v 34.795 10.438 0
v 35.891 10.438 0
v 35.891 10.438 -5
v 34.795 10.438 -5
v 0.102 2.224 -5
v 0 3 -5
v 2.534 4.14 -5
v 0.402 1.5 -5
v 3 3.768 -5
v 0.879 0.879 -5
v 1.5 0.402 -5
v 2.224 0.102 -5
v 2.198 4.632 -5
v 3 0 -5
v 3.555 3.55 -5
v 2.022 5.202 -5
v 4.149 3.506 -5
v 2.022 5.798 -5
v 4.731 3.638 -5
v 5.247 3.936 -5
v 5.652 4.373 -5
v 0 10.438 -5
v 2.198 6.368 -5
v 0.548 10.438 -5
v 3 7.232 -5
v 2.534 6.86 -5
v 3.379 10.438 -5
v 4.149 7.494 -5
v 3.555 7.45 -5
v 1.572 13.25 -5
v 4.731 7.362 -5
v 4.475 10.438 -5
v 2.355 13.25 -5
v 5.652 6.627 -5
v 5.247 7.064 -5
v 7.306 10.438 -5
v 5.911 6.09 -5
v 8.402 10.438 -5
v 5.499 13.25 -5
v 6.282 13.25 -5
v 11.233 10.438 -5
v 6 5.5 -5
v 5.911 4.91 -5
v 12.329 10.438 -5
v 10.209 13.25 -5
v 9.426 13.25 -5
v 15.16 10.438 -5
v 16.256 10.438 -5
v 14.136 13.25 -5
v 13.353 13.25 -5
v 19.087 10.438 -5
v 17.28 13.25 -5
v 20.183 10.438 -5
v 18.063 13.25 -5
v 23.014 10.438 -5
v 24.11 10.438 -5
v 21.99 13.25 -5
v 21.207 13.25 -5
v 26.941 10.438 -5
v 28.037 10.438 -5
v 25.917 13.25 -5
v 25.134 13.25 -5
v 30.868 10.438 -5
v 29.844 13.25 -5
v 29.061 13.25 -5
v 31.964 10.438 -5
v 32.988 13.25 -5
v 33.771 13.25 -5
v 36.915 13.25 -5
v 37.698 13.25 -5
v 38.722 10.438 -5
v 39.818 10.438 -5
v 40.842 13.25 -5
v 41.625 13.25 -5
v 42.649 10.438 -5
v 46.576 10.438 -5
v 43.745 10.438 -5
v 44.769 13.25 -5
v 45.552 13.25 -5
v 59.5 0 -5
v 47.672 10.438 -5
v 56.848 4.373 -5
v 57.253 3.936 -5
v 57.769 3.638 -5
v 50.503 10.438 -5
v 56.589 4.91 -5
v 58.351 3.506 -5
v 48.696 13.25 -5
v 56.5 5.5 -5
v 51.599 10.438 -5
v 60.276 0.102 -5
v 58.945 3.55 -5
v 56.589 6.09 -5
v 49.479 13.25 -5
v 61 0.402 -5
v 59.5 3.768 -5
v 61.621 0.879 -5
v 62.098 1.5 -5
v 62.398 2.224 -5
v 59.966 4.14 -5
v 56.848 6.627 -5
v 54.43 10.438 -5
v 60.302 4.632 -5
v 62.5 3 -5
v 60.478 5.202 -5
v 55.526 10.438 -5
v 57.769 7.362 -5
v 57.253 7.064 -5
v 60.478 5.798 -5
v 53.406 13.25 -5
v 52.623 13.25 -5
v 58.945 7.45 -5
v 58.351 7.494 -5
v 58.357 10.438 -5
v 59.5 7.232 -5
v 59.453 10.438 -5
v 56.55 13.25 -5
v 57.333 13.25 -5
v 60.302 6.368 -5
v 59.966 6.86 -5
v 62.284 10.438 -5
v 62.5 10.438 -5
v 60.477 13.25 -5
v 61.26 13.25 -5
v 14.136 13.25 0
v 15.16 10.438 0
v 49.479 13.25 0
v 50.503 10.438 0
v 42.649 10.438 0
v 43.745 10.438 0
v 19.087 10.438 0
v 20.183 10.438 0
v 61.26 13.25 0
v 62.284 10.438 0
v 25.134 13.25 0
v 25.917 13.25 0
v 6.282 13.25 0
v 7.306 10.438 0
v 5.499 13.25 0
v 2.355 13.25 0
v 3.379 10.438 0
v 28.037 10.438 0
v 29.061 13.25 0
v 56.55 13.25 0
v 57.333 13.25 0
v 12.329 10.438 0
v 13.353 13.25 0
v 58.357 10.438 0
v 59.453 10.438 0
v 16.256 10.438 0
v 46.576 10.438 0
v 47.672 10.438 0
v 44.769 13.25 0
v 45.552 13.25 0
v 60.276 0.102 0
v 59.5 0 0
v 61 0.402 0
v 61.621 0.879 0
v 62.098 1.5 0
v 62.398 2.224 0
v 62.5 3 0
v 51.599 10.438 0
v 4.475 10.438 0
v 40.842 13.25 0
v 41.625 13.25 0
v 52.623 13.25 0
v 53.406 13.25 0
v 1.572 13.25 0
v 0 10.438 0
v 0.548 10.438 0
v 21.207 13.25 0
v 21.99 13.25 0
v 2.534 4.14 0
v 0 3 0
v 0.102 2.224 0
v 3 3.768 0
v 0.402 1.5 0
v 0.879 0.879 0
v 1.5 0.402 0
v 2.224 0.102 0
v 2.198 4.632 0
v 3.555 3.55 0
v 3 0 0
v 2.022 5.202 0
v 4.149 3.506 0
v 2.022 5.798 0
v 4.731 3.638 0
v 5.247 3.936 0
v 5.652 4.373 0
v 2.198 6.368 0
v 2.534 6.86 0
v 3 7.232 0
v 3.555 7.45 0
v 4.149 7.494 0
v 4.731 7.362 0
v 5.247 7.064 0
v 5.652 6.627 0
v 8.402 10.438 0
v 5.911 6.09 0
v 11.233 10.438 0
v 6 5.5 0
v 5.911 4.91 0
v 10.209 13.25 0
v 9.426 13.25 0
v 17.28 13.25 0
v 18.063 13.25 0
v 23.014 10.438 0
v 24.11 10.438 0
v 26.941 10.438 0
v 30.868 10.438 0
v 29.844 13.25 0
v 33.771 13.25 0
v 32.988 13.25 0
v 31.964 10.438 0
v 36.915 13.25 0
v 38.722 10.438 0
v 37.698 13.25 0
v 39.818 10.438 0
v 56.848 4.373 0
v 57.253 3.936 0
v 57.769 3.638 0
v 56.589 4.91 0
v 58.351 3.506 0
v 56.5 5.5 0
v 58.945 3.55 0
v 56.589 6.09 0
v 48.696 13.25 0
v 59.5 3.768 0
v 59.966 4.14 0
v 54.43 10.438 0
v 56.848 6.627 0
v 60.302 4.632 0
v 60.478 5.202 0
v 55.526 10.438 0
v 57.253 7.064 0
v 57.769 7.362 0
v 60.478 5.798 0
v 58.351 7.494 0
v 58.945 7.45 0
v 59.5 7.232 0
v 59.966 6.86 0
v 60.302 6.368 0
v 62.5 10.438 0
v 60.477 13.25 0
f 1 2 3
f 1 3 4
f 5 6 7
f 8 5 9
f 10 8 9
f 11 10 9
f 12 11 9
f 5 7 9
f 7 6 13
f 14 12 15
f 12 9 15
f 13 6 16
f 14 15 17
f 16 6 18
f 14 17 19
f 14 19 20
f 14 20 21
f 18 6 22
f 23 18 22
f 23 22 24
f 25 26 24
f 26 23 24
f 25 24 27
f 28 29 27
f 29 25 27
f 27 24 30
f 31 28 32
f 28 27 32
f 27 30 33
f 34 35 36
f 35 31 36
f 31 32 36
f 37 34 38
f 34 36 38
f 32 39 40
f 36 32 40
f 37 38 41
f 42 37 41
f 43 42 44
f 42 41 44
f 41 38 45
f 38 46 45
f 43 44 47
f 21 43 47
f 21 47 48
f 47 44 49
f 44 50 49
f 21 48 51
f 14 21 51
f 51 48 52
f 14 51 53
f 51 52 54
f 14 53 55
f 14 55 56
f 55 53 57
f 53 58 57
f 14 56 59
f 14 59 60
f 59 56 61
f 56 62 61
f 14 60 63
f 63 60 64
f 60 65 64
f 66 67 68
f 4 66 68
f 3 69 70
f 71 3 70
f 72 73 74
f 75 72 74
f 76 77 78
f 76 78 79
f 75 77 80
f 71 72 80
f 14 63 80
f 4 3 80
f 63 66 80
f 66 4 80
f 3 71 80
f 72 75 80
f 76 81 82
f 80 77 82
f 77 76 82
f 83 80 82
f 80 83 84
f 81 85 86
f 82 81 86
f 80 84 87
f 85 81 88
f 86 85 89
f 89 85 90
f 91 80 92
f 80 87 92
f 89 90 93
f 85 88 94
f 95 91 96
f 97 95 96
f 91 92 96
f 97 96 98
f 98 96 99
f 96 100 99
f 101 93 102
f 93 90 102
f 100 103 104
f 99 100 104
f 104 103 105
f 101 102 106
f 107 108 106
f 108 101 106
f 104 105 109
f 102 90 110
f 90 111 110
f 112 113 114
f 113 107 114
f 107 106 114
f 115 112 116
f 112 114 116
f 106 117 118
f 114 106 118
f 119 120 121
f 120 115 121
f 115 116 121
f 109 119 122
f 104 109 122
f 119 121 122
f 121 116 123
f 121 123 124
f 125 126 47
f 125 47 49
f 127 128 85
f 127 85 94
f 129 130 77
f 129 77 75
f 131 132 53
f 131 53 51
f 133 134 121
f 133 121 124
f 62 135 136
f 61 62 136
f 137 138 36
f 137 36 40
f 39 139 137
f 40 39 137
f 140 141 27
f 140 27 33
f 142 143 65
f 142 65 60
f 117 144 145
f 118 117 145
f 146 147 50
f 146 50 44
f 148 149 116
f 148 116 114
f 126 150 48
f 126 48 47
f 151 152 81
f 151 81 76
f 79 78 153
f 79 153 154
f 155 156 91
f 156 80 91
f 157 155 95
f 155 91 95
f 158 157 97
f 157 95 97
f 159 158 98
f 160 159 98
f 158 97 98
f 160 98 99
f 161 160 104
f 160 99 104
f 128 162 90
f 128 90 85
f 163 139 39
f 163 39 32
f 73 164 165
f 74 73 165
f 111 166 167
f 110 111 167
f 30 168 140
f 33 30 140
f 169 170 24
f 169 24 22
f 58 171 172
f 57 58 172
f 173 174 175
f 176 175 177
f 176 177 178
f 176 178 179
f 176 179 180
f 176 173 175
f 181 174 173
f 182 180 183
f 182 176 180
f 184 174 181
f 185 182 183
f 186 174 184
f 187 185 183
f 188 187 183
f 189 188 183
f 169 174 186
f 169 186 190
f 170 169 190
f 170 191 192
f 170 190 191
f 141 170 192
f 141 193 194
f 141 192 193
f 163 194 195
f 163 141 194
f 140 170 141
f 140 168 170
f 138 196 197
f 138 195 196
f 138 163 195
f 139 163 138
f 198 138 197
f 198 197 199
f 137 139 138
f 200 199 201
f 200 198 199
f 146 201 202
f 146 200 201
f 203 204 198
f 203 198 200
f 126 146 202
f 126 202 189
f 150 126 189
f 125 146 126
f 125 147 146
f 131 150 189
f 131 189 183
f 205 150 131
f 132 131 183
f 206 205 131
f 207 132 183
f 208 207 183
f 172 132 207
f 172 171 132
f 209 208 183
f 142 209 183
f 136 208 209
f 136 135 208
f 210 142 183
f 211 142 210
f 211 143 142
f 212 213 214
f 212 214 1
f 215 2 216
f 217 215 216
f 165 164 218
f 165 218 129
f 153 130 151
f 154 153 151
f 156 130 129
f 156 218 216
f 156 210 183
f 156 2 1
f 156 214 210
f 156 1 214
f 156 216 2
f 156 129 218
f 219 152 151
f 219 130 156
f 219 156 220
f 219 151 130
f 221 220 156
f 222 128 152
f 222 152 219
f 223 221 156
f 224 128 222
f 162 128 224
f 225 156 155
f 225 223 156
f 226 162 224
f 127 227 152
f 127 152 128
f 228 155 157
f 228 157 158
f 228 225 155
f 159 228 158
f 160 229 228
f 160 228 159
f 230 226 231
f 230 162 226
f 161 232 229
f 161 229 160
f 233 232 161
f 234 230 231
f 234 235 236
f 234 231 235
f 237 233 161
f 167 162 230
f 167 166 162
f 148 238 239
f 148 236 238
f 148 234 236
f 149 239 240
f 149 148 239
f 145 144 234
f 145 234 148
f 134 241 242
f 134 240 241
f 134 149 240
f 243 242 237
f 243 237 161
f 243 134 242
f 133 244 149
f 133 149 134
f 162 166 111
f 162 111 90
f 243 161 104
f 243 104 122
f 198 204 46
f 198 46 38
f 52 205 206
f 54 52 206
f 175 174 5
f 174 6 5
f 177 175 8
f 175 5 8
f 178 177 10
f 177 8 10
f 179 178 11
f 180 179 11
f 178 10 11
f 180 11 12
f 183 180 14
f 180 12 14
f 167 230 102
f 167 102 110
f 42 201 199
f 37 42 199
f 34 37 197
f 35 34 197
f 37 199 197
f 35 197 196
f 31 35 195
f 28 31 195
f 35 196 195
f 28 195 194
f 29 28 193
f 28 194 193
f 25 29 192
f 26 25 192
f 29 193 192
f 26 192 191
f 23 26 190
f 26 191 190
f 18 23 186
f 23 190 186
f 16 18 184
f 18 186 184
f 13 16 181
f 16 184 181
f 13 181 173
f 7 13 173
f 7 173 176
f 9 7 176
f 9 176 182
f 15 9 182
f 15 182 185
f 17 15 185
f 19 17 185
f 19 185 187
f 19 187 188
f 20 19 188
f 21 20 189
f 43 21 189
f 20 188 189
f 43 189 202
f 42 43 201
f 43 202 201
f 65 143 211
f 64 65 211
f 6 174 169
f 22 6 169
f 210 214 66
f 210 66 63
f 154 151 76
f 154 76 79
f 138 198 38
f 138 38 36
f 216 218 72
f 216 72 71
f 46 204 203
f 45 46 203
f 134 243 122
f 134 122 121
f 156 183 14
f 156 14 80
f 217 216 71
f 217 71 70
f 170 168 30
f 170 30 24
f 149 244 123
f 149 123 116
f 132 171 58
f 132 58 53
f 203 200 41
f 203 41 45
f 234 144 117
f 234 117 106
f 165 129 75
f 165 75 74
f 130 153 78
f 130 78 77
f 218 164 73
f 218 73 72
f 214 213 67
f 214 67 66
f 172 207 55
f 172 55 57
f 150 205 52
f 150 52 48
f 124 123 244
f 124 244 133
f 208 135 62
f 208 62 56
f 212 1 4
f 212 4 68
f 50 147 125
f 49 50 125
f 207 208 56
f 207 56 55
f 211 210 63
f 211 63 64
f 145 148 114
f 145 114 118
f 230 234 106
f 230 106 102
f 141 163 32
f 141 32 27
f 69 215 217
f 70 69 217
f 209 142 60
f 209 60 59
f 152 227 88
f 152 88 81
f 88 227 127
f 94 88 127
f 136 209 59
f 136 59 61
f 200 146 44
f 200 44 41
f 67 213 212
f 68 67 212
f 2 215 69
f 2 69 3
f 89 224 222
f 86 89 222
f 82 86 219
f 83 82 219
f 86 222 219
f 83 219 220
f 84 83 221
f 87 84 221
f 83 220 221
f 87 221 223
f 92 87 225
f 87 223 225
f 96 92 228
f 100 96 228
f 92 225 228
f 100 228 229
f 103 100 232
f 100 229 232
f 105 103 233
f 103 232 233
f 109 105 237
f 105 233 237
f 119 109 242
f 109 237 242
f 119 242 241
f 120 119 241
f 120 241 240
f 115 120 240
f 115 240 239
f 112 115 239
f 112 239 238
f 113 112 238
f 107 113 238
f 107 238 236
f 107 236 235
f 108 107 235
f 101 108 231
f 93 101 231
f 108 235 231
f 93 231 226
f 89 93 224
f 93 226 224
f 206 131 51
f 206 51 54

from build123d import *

# Parameters (mm, degrees)
BLANKSKE_W        = 62.5
BLANKSKE_H        = 13.25
BLANKSKE_R        = 2
BLANK_DEPTH       = 5
TOOTHCUTSIM_DEPTH = 65.084416983
TEETHCUTS_COUNT   = 17
TEETHCUTS_PITCH   = 3.926990813
FILLET1_R         = 3


with BuildPart() as part:
    # BlankSke → Blank (new body)
    with BuildSketch(Plane.XY):
        with Locations((31.25, 6.625)):
            Rectangle(BLANKSKE_W, BLANKSKE_H)
        with Locations((4, 5.5)):
            Circle(BLANKSKE_R, mode=Mode.SUBTRACT)
        with Locations(Location((58.5, 5.5, 0), (0, 0, 180))):
            Circle(BLANKSKE_R, mode=Mode.SUBTRACT)
    extrude(amount=-BLANK_DEPTH)

    # TooCutSkeSim → ToothCutSim (cut, through all)
    with BuildSketch(Plane.XY):
        Polygon((0.548044212, 10.4375), (-0.548044212, 10.4375), (-1.58095534, 13.2754), (1.58095534, 13.2754), align=None)
    toothcutsim = extrude(amount=-TOOTHCUTSIM_DEPTH, mode=Mode.SUBTRACT)

    # TeethCuts: ToothCutSim ×17
    with Locations(*[(i * TEETHCUTS_PITCH, 0, 0) for i in range(1, TEETHCUTS_COUNT)]):
        add(toothcutsim, mode=Mode.SUBTRACT)

    # Fillet1
    fillet1_edges = [part.edges().sort_by_distance(p)[0] for p in [
        (62.5, 0, -2.5),
        (0, 0, -2.5),
    ]]
    fillet(fillet1_edges, radius=FILLET1_R)


solid = part.part
